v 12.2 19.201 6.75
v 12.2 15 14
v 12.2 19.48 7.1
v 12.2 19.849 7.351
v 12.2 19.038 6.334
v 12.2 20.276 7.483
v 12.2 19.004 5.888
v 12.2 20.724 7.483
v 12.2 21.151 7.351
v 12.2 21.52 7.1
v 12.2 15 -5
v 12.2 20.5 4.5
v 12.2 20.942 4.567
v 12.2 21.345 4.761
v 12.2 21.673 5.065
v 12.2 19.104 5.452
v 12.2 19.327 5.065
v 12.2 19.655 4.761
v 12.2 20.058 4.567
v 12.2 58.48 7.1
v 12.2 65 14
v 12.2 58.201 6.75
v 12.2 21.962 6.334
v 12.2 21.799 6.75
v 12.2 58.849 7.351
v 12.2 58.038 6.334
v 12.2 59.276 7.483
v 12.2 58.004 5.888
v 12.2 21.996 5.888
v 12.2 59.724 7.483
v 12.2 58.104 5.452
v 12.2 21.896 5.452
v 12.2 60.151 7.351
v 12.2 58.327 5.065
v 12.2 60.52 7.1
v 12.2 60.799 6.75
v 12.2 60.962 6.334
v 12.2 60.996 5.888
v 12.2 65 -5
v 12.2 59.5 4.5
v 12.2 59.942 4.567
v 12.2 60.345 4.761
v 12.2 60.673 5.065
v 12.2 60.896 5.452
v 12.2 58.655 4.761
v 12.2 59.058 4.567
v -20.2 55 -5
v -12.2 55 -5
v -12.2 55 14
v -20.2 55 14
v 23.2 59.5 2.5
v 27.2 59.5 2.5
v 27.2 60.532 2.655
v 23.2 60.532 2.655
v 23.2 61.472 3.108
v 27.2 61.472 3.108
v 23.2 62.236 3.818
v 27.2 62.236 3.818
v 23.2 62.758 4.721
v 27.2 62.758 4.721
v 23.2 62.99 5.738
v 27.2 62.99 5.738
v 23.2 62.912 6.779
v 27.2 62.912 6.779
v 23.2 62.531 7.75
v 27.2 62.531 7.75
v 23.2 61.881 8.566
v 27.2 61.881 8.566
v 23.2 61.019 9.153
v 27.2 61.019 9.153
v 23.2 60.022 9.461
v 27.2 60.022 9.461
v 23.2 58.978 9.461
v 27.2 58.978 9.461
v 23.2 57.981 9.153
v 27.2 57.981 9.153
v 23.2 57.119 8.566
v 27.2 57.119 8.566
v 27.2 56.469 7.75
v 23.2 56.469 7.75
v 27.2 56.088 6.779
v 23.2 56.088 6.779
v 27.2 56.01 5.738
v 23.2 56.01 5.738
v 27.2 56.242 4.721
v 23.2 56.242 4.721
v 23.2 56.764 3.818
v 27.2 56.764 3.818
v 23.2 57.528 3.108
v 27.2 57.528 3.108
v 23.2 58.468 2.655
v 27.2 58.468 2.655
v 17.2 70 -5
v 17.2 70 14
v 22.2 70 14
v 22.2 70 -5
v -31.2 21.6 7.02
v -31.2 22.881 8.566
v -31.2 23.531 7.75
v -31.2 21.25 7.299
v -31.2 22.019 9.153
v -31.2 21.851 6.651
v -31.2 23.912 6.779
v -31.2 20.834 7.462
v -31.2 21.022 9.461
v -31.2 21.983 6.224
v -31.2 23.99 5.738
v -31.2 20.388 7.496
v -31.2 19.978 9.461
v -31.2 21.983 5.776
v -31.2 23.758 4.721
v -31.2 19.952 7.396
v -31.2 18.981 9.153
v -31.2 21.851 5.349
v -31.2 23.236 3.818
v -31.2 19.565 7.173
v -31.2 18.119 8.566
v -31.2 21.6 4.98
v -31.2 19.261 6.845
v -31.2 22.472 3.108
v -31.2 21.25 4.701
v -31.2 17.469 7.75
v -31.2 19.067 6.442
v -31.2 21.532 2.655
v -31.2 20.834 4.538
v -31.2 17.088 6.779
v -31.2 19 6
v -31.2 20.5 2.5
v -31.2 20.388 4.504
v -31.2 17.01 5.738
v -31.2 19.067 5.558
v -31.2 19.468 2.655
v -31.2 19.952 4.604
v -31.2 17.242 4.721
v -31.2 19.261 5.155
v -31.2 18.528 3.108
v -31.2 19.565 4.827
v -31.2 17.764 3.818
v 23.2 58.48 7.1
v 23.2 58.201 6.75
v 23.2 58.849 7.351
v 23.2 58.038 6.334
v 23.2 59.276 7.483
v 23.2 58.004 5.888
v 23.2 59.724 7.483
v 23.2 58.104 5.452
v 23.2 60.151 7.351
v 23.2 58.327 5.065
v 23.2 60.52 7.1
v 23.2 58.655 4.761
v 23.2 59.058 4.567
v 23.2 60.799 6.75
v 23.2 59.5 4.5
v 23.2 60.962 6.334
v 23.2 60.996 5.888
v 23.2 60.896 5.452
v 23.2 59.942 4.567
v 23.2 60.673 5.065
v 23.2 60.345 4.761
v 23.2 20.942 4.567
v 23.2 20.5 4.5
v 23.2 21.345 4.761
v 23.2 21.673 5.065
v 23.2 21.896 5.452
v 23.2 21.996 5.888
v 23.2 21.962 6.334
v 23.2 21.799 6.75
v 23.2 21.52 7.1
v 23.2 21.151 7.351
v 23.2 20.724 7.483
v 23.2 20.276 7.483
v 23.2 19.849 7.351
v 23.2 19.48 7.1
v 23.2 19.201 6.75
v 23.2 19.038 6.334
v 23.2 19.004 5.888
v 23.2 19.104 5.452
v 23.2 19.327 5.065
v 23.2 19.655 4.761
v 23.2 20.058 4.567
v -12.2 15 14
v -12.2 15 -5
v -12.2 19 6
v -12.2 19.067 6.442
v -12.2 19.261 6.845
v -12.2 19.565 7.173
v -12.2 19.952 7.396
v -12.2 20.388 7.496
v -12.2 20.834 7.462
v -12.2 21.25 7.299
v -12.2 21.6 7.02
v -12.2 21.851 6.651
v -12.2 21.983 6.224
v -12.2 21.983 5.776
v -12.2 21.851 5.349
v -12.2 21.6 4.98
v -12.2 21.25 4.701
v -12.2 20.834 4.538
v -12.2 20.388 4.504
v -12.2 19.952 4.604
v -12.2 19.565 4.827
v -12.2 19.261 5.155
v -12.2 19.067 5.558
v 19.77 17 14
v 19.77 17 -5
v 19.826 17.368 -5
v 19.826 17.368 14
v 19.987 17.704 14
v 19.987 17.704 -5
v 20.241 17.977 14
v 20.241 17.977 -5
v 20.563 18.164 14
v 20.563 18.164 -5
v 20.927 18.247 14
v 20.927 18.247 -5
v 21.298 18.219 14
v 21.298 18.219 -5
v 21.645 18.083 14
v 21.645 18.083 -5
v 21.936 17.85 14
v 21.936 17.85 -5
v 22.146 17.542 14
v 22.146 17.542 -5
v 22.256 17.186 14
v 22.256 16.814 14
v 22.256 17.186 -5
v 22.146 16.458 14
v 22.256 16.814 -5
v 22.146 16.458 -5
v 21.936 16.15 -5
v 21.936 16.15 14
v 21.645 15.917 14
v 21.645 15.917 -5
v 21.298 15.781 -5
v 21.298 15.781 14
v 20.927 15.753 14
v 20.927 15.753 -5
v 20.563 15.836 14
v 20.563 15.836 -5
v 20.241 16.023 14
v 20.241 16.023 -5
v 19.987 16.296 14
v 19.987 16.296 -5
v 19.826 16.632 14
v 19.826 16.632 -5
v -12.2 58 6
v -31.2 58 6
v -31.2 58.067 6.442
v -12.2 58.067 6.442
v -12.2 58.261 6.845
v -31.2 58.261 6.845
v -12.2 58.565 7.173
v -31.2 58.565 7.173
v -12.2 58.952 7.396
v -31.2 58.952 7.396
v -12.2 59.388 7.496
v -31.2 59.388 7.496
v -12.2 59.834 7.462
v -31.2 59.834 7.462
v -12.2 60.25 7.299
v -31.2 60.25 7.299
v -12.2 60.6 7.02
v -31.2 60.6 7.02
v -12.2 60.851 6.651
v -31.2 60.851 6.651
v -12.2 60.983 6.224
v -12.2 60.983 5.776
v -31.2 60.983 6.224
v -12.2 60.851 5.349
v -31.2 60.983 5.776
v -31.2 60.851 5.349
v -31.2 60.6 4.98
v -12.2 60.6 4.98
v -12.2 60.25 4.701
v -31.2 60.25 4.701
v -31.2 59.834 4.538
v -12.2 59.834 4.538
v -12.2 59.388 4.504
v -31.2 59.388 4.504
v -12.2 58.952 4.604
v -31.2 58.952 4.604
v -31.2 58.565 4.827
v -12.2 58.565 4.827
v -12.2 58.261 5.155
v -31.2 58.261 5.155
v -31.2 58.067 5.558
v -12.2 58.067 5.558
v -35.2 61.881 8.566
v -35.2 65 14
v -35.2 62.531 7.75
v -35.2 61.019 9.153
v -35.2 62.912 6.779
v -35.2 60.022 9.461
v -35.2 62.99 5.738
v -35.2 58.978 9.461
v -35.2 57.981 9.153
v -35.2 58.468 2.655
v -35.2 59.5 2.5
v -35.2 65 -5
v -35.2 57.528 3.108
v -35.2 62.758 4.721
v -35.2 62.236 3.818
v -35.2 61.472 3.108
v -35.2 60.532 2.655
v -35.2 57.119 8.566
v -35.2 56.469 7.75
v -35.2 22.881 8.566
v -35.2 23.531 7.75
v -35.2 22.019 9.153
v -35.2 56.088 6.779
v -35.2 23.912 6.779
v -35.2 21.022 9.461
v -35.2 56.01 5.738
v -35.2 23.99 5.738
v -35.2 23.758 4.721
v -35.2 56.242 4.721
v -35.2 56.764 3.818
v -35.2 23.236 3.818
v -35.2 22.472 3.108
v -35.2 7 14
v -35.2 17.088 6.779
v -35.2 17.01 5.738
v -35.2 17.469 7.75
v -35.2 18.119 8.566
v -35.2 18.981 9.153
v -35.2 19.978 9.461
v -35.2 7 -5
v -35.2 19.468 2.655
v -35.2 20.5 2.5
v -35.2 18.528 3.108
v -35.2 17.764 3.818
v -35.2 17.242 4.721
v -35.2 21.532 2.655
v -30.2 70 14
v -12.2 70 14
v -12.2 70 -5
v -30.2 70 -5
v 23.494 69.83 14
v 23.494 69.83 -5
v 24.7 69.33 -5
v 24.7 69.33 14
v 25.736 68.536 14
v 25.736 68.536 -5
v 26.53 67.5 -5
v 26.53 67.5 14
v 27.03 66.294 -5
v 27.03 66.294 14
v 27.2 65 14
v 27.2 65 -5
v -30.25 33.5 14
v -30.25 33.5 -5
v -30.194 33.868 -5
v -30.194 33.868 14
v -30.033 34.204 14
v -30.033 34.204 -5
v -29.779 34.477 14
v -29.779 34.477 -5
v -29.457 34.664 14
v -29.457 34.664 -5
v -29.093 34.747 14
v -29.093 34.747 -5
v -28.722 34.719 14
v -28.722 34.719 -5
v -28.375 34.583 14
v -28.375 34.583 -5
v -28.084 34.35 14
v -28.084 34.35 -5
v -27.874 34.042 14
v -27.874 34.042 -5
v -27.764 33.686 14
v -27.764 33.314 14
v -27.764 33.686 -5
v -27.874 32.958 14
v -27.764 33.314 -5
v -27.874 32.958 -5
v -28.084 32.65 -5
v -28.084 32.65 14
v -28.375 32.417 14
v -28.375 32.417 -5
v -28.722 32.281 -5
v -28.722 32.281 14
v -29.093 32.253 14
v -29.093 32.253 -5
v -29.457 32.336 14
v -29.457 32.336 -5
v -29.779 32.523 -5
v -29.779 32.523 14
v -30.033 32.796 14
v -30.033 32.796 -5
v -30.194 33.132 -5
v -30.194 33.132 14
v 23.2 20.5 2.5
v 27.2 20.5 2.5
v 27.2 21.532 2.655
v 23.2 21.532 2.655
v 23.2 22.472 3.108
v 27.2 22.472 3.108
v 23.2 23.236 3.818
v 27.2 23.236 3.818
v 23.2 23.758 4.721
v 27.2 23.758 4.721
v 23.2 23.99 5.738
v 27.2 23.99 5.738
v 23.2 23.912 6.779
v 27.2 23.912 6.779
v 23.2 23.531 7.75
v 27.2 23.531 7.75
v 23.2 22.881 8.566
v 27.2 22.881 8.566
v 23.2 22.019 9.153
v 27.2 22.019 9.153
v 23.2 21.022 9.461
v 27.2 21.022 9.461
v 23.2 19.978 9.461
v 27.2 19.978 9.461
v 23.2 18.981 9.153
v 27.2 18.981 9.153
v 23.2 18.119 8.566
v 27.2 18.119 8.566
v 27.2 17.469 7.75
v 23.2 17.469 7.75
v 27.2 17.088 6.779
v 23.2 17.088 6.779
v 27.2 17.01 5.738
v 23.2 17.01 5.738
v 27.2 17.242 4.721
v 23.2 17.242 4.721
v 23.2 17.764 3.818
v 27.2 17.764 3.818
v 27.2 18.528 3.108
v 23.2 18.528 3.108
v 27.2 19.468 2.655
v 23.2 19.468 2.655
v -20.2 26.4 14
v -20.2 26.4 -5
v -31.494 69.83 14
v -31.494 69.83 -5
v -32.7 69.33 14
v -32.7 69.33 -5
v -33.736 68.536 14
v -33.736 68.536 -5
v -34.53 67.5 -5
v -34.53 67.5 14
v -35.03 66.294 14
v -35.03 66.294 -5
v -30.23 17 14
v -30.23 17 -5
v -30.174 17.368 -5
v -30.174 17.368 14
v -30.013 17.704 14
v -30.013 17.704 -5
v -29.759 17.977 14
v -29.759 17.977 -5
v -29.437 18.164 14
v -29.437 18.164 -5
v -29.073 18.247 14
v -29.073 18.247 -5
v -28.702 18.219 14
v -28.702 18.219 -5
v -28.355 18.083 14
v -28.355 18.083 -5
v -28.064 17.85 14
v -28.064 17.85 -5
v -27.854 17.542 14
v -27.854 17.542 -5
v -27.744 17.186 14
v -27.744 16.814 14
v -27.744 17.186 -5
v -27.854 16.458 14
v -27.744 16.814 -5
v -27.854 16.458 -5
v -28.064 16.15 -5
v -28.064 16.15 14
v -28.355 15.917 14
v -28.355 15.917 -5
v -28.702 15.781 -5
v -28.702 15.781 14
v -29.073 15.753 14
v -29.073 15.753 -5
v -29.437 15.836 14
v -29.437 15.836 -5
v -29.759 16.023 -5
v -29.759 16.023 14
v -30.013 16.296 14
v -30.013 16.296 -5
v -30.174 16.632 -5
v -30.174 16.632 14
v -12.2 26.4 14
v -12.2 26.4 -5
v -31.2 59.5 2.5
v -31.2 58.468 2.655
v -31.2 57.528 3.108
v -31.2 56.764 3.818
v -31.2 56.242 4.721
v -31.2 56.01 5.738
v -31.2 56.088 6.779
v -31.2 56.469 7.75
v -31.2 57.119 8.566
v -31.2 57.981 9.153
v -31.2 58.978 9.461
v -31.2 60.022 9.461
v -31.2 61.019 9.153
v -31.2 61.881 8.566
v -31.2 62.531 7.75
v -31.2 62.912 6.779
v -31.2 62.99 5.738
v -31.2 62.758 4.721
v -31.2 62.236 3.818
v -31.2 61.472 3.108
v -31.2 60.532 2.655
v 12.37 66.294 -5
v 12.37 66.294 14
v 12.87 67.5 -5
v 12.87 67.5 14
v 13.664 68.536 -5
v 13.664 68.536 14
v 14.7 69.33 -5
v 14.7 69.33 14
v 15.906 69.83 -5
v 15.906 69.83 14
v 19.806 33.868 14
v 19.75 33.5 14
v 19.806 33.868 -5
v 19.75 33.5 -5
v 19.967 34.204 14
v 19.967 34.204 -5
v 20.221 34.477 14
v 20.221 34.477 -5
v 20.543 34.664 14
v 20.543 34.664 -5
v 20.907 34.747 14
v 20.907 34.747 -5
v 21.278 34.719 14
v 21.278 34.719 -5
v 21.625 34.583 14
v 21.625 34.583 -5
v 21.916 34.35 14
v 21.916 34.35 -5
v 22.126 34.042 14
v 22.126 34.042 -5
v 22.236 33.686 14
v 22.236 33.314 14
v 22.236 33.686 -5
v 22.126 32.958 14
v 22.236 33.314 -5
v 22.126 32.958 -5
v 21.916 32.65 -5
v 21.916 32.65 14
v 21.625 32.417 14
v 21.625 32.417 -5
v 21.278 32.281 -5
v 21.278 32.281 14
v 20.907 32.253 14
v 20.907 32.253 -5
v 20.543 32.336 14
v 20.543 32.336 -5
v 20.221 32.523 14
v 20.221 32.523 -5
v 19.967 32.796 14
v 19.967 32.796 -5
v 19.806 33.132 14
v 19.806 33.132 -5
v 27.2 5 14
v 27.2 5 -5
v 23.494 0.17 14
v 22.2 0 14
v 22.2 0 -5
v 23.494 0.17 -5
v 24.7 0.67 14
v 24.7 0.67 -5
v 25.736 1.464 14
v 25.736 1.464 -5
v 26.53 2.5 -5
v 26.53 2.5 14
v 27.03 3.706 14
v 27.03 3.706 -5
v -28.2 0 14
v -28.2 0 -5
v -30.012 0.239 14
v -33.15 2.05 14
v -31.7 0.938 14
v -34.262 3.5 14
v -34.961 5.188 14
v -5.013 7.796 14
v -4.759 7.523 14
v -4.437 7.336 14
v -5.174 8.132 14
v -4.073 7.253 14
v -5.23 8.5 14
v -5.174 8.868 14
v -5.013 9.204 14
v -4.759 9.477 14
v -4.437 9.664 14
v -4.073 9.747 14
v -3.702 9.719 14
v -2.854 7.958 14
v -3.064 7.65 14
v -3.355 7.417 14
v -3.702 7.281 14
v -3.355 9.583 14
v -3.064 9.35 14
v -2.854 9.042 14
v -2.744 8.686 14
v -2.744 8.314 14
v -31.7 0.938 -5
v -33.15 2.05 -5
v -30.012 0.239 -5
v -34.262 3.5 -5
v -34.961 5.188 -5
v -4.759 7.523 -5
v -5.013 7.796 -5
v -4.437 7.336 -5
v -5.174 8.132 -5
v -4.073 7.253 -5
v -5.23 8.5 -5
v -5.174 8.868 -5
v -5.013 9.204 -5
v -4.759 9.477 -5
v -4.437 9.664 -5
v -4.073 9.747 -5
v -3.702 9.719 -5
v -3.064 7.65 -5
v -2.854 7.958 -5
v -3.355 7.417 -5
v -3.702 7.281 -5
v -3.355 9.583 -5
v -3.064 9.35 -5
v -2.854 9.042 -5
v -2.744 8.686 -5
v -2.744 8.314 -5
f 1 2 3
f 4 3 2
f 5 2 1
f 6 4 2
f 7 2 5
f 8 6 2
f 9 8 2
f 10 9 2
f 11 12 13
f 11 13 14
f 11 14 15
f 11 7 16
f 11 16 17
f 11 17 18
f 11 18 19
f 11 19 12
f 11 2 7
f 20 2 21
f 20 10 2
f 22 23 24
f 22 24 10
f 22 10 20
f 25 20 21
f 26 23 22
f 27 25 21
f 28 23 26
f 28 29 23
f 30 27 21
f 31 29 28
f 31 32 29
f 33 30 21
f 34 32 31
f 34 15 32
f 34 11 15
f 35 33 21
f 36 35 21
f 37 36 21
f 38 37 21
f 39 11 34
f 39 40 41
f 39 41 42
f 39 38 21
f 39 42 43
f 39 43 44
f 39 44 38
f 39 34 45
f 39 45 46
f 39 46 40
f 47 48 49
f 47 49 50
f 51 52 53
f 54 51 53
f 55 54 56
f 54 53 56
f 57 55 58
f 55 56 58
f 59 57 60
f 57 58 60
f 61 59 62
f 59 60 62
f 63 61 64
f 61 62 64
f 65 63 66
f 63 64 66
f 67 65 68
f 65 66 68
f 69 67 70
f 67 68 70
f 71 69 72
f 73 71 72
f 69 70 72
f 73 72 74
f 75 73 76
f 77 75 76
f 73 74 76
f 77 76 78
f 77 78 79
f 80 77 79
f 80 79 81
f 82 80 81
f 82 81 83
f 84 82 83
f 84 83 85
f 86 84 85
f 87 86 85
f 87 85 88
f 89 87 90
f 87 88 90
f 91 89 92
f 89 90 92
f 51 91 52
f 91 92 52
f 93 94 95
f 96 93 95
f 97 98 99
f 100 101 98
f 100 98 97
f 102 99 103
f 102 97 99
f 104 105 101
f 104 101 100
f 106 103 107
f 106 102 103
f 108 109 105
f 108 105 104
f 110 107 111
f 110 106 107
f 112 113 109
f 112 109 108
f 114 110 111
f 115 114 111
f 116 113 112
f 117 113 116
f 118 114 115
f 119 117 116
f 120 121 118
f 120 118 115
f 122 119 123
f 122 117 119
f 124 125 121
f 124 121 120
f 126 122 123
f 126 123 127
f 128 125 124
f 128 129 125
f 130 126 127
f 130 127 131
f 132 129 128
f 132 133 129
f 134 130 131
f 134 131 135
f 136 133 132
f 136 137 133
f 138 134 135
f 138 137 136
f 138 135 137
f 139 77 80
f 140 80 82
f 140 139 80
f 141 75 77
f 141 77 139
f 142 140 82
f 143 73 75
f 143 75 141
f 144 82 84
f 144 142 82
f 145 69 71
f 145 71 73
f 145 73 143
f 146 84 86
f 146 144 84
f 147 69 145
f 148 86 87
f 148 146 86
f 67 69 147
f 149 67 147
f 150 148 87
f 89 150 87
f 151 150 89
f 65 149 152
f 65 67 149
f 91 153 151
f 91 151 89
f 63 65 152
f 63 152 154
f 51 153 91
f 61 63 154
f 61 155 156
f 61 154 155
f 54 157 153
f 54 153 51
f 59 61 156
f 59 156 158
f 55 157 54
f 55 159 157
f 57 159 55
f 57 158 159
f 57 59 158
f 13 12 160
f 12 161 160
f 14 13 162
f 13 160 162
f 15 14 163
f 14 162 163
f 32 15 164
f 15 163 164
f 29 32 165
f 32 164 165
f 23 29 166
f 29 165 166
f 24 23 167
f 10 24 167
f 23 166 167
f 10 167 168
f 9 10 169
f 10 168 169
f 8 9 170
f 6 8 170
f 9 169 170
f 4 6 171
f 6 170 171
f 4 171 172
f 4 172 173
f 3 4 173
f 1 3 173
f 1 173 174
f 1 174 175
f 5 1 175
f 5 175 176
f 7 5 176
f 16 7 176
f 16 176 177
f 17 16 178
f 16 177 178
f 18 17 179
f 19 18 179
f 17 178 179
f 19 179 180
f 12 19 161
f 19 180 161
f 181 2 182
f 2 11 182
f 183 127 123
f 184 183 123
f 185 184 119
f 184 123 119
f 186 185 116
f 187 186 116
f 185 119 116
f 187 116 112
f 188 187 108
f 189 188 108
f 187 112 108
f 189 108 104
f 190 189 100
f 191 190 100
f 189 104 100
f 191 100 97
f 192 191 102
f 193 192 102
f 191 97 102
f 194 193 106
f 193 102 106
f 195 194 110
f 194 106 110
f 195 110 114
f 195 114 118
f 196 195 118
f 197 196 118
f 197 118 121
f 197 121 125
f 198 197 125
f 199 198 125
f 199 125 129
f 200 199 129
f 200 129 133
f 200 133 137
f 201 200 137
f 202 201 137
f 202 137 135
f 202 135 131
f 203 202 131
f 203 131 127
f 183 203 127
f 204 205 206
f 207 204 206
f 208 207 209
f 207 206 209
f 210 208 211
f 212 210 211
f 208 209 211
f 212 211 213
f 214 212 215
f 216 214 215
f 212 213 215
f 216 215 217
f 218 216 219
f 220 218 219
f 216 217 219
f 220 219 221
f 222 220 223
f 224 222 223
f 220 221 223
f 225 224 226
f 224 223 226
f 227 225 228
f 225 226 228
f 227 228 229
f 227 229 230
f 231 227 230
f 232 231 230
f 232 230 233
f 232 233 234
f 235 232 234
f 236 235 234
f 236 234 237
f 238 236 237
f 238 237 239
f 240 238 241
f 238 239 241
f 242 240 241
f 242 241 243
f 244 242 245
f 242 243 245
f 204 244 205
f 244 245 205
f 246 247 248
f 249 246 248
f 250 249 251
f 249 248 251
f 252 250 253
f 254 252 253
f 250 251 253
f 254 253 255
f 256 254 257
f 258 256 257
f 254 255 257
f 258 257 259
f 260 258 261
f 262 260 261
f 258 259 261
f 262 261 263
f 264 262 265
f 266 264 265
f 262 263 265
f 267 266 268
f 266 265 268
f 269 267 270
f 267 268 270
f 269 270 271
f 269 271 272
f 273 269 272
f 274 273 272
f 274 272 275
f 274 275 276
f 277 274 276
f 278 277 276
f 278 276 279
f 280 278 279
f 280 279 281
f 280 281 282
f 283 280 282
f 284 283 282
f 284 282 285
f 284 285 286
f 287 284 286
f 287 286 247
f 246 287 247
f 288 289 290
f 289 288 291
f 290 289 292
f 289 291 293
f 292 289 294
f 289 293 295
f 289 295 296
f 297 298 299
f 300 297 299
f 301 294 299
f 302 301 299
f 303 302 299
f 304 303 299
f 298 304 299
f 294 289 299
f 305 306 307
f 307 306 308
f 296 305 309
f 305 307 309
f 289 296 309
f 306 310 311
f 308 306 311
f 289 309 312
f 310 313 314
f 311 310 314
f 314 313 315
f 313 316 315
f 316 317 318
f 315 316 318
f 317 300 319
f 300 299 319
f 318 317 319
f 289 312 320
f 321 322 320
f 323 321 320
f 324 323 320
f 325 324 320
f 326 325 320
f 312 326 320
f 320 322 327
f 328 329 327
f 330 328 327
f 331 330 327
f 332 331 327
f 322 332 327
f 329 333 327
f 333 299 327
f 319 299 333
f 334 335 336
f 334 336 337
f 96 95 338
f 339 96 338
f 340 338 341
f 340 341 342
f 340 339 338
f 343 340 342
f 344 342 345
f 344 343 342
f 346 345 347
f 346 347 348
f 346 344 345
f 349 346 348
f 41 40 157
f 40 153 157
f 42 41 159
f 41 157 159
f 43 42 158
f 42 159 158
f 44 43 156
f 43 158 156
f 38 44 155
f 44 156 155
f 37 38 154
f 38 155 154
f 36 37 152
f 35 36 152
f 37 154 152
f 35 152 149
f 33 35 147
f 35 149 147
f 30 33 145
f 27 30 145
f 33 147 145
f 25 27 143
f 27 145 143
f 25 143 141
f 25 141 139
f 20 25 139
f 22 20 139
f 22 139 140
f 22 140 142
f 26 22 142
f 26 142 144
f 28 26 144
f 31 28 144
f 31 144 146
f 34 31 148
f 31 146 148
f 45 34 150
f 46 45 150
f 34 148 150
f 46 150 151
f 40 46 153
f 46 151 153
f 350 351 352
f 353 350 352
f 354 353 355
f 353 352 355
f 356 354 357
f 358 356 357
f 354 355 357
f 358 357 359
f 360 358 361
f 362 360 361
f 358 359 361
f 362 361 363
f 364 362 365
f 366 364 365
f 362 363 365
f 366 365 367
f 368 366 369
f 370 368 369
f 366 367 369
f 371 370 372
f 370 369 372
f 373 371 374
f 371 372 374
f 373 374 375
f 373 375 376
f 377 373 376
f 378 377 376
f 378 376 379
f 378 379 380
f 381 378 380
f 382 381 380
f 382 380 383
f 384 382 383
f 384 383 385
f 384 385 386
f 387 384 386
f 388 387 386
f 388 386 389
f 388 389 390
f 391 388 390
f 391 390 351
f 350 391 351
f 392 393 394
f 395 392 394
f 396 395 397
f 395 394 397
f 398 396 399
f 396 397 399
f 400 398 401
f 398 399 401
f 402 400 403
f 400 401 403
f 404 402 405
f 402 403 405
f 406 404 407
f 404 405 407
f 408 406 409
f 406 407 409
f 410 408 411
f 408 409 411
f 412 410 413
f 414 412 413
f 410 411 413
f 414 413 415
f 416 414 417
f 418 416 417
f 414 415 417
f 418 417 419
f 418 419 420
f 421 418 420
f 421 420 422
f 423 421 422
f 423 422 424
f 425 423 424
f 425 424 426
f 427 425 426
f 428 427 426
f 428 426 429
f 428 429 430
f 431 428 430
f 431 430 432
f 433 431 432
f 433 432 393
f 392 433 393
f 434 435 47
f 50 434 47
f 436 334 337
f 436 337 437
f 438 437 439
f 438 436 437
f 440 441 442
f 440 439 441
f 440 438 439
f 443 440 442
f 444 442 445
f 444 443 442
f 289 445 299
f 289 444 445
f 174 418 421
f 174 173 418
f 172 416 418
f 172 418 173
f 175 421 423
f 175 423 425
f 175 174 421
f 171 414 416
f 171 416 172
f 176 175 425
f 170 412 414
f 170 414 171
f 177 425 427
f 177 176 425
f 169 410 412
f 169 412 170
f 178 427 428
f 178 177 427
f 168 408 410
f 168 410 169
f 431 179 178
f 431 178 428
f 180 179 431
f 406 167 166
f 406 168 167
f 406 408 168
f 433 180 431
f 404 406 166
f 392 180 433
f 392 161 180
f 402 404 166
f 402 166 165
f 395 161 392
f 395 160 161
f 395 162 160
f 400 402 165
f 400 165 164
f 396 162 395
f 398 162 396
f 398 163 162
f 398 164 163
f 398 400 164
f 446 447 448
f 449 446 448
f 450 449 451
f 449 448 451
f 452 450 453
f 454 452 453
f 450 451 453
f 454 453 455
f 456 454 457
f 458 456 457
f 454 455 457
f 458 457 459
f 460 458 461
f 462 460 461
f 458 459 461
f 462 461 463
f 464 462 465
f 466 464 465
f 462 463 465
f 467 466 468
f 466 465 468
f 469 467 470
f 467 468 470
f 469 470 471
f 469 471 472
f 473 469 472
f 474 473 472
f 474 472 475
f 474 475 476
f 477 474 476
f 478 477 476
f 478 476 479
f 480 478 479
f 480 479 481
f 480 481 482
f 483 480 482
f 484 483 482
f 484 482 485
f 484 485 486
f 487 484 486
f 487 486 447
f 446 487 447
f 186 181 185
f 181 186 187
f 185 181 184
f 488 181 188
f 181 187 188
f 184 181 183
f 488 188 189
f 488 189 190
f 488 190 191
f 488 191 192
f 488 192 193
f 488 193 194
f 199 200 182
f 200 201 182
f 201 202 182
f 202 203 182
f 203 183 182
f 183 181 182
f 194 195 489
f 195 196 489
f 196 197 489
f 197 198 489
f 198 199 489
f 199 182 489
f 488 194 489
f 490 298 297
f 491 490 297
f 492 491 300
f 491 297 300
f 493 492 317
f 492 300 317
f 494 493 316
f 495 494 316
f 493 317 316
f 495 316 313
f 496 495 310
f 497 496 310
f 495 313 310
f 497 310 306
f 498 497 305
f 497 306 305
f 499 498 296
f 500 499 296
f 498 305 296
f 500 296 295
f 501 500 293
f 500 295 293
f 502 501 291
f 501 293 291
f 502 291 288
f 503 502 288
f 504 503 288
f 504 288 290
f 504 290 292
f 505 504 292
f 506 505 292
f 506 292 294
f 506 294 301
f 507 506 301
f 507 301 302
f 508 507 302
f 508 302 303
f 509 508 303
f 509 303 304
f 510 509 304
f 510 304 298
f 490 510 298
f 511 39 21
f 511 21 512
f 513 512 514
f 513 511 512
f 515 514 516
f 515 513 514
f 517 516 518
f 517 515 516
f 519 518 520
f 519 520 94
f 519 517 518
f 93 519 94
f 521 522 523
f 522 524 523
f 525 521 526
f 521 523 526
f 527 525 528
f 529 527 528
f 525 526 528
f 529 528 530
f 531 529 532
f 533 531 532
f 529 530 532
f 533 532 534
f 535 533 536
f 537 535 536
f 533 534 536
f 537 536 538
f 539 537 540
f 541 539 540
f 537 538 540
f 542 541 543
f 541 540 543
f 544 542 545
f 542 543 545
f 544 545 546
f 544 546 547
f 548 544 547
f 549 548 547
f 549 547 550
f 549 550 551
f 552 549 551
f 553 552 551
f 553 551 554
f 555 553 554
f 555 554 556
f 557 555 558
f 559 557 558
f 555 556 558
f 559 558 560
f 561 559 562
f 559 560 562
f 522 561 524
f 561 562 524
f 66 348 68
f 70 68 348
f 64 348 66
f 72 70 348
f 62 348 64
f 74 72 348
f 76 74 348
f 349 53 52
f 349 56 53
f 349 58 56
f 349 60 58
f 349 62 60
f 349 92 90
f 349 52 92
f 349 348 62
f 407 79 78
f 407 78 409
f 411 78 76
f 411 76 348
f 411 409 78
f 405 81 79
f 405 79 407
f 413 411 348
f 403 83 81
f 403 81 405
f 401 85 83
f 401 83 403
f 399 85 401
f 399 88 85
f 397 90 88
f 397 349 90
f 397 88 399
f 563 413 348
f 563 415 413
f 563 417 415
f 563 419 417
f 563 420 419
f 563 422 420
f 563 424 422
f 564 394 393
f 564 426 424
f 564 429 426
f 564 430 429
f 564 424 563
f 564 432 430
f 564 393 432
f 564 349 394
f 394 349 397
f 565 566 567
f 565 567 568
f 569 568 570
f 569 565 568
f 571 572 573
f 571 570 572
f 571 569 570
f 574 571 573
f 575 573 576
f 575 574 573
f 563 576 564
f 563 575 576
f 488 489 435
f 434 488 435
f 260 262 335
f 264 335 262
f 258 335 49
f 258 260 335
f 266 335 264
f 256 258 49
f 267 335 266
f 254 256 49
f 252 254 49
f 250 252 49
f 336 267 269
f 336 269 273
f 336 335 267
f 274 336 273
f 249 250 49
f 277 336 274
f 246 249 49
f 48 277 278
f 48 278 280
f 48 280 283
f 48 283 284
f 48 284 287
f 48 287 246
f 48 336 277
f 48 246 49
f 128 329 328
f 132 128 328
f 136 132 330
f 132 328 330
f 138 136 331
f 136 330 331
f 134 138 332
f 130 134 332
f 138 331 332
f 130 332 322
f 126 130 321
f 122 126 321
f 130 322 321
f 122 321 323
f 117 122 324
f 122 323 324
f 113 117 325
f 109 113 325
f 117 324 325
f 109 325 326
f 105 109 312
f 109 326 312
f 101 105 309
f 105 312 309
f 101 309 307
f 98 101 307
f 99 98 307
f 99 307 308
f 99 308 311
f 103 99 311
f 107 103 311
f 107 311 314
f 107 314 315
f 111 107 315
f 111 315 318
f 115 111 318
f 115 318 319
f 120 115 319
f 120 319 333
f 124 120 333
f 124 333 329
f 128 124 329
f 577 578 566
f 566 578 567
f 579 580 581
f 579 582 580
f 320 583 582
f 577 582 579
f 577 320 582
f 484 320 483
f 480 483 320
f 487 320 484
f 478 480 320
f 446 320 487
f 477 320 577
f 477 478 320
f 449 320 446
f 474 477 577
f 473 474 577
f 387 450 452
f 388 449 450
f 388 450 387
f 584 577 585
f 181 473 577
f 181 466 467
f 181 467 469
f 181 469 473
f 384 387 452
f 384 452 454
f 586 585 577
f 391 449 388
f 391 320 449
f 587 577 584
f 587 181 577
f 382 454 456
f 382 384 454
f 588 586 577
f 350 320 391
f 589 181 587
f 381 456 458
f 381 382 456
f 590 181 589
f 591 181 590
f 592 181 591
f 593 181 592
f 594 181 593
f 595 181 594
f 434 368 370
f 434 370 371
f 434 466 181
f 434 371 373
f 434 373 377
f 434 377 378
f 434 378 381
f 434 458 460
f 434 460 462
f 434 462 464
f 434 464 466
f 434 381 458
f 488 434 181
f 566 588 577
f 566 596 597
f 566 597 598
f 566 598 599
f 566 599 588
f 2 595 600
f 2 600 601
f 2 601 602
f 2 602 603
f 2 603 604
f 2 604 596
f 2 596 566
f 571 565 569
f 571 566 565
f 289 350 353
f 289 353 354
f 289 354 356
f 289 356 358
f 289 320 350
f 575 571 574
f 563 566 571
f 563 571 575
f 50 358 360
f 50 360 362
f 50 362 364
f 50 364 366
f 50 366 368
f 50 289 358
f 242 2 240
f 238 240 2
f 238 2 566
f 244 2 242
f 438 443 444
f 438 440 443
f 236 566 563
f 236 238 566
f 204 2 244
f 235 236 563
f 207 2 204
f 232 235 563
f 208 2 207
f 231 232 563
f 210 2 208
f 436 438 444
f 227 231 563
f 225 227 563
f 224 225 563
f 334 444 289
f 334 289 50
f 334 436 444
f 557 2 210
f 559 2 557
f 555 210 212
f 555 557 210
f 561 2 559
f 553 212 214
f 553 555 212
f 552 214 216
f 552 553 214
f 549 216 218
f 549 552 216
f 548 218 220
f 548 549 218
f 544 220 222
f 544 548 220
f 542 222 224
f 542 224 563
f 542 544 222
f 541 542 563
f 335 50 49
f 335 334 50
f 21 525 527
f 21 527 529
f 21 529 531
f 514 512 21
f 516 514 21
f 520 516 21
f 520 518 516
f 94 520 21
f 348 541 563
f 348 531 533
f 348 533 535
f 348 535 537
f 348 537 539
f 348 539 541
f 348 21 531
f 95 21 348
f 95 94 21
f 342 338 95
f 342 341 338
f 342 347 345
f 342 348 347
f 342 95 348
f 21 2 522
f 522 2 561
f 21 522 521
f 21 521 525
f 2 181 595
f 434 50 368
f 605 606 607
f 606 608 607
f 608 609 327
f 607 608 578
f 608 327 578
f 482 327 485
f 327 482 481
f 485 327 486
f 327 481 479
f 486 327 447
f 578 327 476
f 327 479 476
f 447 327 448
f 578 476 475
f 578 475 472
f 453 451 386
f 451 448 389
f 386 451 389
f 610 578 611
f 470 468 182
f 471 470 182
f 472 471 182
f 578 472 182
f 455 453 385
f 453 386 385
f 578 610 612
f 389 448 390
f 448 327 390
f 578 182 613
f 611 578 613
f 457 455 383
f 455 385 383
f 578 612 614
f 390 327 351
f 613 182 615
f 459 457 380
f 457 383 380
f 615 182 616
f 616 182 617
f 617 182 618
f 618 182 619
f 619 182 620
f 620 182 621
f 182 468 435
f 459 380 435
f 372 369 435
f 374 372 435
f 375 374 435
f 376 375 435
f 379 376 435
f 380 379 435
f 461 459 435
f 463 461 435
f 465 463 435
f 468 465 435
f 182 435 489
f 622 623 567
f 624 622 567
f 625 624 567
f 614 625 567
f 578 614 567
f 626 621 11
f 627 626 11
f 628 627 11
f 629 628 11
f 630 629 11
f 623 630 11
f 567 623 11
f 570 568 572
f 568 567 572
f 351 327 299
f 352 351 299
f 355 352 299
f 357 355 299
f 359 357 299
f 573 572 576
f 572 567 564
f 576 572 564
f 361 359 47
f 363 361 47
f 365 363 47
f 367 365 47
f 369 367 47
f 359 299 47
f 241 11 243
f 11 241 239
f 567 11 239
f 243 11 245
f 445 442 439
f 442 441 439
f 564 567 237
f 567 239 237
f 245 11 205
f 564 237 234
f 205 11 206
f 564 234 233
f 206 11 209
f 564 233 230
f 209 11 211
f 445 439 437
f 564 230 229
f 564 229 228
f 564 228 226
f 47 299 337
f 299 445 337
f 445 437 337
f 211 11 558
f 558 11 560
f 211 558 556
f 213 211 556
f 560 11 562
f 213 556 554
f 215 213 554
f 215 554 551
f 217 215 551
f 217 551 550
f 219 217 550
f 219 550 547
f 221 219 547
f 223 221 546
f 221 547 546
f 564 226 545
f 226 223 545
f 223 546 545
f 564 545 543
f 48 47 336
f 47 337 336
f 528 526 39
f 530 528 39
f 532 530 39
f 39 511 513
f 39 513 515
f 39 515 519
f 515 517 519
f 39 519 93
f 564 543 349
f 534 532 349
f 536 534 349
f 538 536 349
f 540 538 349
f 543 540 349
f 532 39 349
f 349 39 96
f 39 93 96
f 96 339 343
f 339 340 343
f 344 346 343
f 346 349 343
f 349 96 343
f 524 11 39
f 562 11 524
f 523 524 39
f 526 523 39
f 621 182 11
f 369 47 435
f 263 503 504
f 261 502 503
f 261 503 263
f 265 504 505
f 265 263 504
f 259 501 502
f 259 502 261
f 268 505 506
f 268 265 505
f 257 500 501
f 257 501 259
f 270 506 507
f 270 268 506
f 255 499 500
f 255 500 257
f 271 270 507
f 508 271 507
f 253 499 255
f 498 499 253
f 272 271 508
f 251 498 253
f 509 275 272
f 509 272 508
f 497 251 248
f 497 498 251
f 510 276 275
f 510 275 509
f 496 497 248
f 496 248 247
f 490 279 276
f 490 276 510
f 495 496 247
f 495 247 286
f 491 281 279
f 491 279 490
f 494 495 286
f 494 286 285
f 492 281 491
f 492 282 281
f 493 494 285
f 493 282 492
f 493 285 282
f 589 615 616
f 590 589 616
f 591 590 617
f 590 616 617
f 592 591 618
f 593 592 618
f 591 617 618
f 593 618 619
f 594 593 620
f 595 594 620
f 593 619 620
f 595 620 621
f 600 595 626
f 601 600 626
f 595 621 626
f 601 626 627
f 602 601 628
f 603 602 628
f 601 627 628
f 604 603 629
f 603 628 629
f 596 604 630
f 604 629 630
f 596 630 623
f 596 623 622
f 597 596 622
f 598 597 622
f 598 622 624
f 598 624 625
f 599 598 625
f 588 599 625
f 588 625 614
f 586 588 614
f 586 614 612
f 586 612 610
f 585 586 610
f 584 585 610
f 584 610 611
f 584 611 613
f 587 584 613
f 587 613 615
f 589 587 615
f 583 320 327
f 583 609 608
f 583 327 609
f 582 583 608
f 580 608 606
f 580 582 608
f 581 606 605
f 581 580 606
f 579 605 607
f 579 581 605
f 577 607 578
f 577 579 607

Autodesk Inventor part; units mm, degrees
ref_plane "YZ Plane" through (0, 0, 0) normal (1, 0, 0) x (0, 1, 0)
ref_plane "XZ Plane" through (0, 0, 0) normal (0, 1, 0) x (-1, 0, 0)
ref_plane "XY Plane" through (0, 0, 0) normal (0, 0, 1) x (1, 0, 0)
sketch "Эскиз1" plane through (0, 0, 0) normal (0, 0, 1) x (1, 0, 0)
  line L0 (0, 0) -> (27.2, 0)
  line L1 (27.2, 0) -> (27.2, 22.4859)
  line L2 (12.2, 15) -> (0, 15)
  line L3 (0, 15) -> (0, 0)
  line L4 (27.2, 0) -> (21.9283, 0)
  line L5 (12.2, 15) -> (12.2, 70)
  line L6 (12.2, 70) -> (27.2, 70)
  line L7 (27.2, 70) -> (27.2, 0)
  line L8 (0, 0) -> (-35.2, 0)
  line L9 (-12.2, 15) -> (0, 15)
  line L10 (-20.2, 26.4) -> (-20.2, 55)
  line L11 (-20.2, 70) -> (-35.2, 70)
  line L12 (-35.2, 70) -> (-35.2, 0)
  line L13 (-12.2, 15) -> (-12.2, 26.4)
  line L14 (-12.2, 26.4) -> (-20.2, 26.4)
  line L15 (-20.2, 70) -> (-12.2, 70)
  line L16 (-12.2, 70) -> (-12.2, 55)
  line L17 (-12.2, 55) -> (-20.2, 55)
  line L18 (12.2, 60) -> (12.2, 70)
  dimension "d37" = 11.4
  dimension "d38" = 8
  dimension "d40" = 15
  dimension "d41" = 70
  dimension "d45" = 12.2
  dimension "d54" = 23
  dimension "d55" = 15
  dimension "d56" = 23
  dimension "d57" = 15
  dimension "d58" = 15
  dimension "d60" = 12.2
extrude "Выдавливание1" add sketch "Эскиз1" along normal blind 14 and the other way blind 5
sketch "Эскиз3" plane through (0, 0, -5) normal (0, 0, -1) x (-1, 0, 0)
  circle A0 centre (28.98, 17) radius 1.25
  circle A1 centre (3.98, 8.5) radius 1.25
  circle A2 centre (-21.02, 17) radius 1.25
  line L0 (-27.2, 0) -> (35.2, 0) projected
  circle A3 centre (29, 33.5) radius 1.25
  circle A4 centre (-21, 33.5) radius 1.25
  point P0 (0, 0)
  point P1 (4, 0)
  dimension "d10" = 2.5
  dimension "d12" = 8.5
  dimension "d14" = 50
  dimension "d27" = 17
  dimension "d28" = 25
  dimension "d29" = 17
  dimension "d30" = 25
extrude "Выдавливание3" cut sketch "Эскиз3" against normal up to surface (19 mm away)
fillet "Сопряжение1" radius 5 4 edges at (27.2, 0, 4.5) (-35.2, 70, 4.5) (12.2, 70, 4.5) (27.2, 70, 4.5)
sketch "Эскиз5" plane through (-35.2, 0, -5) normal (-1, 0, 0) x (0, -1, 0)
  circle A0 centre (-20.5, 11) radius 1.5 projected
  circle A1 centre (-59.5, 11) radius 1.5 projected
  point P0 (0, 5)
extrude "Выдавливание5" cut sketch "Эскиз5" against normal up to surface (23 mm away)
sketch "Эскиз6" plane through (27.2, 5, 14) normal (1, 0, 0) x (0, 0, -1)
  circle A0 centre (8, 15.5) radius 1.5 projected
  circle A1 centre (8, 54.5) radius 1.5 projected
  point P0 (14, -5)
extrude "Выдавливание6" cut sketch "Эскиз6" against normal up to surface (15 mm away)
sketch "Эскиз7" plane through (27.2, 5, 14) normal (1, 0, 0) x (0, 0, -1)
  circle A0 centre (8, 15.5) radius 3.5
  circle A1 centre (8, 54.5) radius 3.5
  circle A2 centre (8, 15.5) radius 1.5 construction
  circle A3 centre (8, 54.5) radius 1.5 construction
  point P0 (14, -5)
  dimension "d47" = 7
extrude "Выдавливание7" cut sketch "Эскиз7" against normal blind 4
sketch "Эскиз8" plane through (-35.2, 0, -5) normal (-1, 0, 0) x (0, 0, -1)
  circle A0 centre (-11, -20.5) radius 1.5 construction
  circle A1 centre (-11, -59.5) radius 1.5 construction
  line L0 (0, -15) -> (-19, -15) projected
  circle A2 centre (-11, -20.5) radius 3.5
  circle A3 centre (-11, -59.5) radius 3.5
  point P0 (-5, 0)
extrude "Выдавливание8" cut sketch "Эскиз8" against normal blind 4
fillet "Сопряжение2" radius 7 1 edges at (-35.2, 0, 4.5)
properties part number "Крепление стрелялки"
